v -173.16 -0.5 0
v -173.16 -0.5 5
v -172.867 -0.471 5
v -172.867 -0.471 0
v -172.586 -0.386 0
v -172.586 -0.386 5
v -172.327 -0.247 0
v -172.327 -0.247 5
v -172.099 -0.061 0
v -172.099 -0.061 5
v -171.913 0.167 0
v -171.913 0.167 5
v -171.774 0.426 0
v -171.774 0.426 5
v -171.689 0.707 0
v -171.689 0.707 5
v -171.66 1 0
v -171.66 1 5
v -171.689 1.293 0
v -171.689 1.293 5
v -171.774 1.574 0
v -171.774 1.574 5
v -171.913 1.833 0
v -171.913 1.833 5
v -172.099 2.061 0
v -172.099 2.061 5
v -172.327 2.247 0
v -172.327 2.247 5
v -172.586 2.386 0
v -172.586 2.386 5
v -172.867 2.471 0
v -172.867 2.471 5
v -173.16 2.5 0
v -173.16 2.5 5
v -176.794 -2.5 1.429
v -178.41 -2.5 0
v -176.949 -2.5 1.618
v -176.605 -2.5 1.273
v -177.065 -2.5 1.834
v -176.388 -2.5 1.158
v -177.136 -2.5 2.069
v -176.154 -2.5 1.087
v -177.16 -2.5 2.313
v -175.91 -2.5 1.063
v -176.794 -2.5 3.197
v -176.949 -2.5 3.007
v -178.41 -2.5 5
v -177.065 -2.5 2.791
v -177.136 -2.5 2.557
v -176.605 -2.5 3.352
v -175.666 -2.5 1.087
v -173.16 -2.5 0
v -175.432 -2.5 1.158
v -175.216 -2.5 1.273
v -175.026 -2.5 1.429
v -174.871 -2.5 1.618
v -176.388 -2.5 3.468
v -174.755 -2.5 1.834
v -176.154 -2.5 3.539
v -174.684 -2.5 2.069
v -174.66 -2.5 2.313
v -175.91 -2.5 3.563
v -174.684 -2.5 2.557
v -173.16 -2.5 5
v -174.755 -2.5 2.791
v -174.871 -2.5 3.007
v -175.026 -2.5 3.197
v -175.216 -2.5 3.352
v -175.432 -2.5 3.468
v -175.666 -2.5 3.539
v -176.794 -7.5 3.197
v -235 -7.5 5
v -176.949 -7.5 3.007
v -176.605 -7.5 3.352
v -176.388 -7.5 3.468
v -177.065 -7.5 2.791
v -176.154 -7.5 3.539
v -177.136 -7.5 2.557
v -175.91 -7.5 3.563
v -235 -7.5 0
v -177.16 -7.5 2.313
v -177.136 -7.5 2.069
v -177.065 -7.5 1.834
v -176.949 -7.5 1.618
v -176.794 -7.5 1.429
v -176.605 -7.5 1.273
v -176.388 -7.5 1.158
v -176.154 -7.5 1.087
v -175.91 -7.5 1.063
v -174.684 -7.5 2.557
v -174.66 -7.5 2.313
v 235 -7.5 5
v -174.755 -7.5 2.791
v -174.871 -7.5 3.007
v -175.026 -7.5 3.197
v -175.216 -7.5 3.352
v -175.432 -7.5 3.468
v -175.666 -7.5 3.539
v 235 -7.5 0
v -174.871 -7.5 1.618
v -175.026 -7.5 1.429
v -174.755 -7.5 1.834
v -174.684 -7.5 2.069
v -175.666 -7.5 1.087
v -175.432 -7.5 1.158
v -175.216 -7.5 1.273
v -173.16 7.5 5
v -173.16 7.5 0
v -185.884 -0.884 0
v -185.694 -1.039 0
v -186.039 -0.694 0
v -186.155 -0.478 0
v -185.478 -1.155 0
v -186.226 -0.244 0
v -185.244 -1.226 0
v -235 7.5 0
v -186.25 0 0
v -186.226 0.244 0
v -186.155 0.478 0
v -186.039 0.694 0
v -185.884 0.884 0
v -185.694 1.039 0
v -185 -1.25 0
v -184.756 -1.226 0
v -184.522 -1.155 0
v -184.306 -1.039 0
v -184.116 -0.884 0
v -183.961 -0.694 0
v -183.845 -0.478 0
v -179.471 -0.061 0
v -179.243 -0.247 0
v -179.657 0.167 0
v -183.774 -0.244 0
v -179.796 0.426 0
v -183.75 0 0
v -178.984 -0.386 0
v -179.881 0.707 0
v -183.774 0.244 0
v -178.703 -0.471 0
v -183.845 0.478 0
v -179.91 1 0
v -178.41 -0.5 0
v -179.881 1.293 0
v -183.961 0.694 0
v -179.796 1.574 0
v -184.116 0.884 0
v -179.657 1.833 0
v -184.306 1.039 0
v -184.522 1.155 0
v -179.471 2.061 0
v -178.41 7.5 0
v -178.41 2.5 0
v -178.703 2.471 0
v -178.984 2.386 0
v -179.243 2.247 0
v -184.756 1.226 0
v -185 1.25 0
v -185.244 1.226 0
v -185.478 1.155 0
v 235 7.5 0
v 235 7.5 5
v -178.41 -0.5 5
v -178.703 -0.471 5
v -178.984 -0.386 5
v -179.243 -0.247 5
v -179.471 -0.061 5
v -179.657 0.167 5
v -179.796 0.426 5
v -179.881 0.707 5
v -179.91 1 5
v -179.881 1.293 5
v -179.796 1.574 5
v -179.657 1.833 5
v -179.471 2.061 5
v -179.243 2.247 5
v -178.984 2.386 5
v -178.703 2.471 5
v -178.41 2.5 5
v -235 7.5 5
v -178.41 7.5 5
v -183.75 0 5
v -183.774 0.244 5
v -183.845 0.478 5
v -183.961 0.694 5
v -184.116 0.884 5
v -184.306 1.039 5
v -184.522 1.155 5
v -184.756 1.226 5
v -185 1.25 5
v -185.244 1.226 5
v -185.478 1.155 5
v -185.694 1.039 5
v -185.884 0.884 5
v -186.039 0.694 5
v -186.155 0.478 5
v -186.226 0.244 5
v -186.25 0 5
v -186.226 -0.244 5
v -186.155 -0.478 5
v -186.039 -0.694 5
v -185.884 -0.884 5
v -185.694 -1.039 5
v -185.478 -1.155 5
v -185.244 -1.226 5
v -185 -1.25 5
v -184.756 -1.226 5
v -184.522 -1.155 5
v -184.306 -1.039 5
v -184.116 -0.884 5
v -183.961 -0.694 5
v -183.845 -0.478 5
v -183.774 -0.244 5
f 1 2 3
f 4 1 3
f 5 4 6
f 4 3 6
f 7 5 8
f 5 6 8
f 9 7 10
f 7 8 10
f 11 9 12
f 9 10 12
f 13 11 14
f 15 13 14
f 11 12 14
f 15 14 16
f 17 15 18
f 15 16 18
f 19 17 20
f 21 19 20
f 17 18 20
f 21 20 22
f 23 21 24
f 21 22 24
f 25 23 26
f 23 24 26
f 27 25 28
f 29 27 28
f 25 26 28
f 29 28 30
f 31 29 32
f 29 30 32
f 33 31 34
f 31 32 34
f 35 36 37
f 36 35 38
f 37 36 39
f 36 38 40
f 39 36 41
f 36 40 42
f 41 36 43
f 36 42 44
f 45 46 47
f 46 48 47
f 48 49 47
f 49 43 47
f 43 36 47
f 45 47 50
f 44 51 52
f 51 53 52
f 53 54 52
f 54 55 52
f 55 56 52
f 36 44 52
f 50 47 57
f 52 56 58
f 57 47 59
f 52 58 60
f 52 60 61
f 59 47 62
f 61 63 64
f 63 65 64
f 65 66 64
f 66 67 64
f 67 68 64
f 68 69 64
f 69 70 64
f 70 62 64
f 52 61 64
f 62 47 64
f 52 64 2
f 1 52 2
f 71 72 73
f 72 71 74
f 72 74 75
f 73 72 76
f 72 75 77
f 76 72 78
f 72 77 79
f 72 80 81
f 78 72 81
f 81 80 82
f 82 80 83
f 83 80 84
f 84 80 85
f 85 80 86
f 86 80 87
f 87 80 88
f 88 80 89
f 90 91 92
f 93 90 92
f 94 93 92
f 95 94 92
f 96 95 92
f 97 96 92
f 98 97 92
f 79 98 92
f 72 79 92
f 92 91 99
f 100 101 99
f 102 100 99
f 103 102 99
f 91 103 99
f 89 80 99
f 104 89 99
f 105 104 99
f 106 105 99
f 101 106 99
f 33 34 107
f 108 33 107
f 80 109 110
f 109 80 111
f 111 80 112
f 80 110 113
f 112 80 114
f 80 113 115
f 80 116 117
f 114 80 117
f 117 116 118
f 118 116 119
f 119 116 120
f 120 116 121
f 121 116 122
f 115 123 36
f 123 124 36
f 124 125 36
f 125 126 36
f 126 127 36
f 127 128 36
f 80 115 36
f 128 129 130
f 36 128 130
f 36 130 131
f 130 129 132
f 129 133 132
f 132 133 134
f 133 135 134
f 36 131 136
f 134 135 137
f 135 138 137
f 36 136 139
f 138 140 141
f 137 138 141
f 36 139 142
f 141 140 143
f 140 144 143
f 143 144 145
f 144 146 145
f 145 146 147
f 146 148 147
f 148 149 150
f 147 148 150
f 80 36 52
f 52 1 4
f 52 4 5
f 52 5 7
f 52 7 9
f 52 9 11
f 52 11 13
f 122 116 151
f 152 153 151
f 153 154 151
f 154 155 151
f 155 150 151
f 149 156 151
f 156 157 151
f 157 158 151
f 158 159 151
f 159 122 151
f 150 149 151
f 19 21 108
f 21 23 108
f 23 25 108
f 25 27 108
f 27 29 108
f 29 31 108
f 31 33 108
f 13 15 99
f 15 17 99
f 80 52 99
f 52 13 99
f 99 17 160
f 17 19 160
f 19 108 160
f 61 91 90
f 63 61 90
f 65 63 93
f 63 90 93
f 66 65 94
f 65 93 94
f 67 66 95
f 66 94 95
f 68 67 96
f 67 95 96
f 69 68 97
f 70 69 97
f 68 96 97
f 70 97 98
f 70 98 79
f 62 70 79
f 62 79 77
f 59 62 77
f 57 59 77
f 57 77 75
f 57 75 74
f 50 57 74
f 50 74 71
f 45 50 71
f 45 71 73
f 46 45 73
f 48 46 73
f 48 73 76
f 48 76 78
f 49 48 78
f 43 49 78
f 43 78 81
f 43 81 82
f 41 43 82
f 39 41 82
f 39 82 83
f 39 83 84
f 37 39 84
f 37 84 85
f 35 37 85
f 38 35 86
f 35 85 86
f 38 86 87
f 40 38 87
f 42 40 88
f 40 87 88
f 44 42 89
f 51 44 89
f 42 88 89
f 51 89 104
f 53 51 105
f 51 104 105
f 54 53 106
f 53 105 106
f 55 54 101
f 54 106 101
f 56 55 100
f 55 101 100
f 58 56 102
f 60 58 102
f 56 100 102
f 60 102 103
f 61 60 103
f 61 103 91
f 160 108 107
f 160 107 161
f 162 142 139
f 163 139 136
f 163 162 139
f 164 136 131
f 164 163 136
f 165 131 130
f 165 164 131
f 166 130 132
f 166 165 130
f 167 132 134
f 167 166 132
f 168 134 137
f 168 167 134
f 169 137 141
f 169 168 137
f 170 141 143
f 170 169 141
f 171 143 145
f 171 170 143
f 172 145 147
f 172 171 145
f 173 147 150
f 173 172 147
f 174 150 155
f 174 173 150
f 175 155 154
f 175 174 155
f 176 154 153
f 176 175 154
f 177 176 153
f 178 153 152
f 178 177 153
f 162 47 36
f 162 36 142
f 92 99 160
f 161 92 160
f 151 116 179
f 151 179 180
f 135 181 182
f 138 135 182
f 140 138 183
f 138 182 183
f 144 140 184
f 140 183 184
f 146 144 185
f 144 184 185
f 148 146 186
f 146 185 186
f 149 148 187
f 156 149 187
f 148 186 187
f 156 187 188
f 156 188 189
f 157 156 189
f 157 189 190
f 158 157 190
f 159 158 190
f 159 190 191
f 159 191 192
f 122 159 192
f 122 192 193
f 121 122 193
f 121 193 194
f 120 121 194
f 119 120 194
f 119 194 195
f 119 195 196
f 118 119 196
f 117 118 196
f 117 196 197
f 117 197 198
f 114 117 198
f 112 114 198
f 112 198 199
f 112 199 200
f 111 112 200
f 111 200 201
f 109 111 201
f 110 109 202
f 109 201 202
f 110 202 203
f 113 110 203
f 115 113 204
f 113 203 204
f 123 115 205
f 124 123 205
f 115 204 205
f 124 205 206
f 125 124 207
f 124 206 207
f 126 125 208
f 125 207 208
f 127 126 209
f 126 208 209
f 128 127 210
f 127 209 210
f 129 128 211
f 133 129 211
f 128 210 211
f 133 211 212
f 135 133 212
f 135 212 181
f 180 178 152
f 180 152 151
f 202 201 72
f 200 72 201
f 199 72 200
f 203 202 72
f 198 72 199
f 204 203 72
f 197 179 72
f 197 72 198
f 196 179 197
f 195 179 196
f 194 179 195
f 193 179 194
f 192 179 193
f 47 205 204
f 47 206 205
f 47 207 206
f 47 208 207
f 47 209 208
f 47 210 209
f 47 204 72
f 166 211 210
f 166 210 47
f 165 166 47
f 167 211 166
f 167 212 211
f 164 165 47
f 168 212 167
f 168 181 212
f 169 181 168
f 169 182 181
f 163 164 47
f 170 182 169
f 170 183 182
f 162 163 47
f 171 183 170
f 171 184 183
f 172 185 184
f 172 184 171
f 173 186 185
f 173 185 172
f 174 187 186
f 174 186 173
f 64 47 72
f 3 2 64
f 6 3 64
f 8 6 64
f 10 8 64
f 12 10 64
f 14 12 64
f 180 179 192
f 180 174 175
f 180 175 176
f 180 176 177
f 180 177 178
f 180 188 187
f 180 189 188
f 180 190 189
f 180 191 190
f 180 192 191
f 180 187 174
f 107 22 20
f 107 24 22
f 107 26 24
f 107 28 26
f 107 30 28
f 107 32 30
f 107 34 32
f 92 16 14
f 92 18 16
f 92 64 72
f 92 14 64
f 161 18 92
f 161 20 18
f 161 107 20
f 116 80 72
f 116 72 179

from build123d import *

# Parameters (mm, degrees)
ESQUISSE1_W             = 470
ESQUISSE1_H             = 15
BOSS_EXTRU_1_DEPTH      = 5
ESQUISSE2_R             = 1.25
ENL_V_MAT_EXTRU_1_DEPTH = 6
ESQUISSE3_W             = 5.25
ESQUISSE3_H             = 10
ENL_V_MAT_EXTRU_2_DEPTH = 6
ESQUISSE4_R             = 1.25
ENL_V_MAT_EXTRU_3_DEPTH = 10
ENL_V_MAT_EXTRU_4_DEPTH = 10


with BuildPart() as part:
    # Esquisse1 → Boss.-Extru.1 (new body)
    with BuildSketch(Plane.XY):
        Rectangle(ESQUISSE1_W, ESQUISSE1_H)
    extrude(amount=BOSS_EXTRU_1_DEPTH)

    # Esquisse2 → Enlèv. mat.-Extru.1 (cut, through all)
    with BuildSketch(Plane.XY.offset(5)):
        with Locations((-185, 0)):
            Circle(ESQUISSE2_R)
    extrude(amount=-ENL_V_MAT_EXTRU_1_DEPTH, mode=Mode.SUBTRACT)

    # Esquisse3 → Enlèv. mat.-Extru.2 (cut, through all)
    with BuildSketch(Plane.XY.offset(5)):
        with Locations((-175.785038425, 2.5)):
            Rectangle(ESQUISSE3_W, ESQUISSE3_H)
    extrude(amount=-ENL_V_MAT_EXTRU_2_DEPTH, mode=Mode.SUBTRACT)

    # Esquisse4 → Enlèv. mat.-Extru.3 (cut)
    with BuildSketch(Plane(origin=(0, -7.5, 0), x_dir=(-1, 0, 0), z_dir=(0, -1, 0))):
        with Locations(Location((175.910038425, -2.312700885, 0), (0, 0, 180))):  # turned: the seam where the file's is
            Circle(ESQUISSE4_R)
    extrude(amount=-ENL_V_MAT_EXTRU_3_DEPTH, mode=Mode.SUBTRACT)

    # Esquisse5 → Enlèv. mat.-Extru.4 (cut)
    with BuildSketch(Plane.XY.offset(5)):
        with BuildLine():
            Line((-178.410038425, 2.5), (-178.410038425, -0.5))
            ThreePointArc((-178.410038425, -0.5), (-179.910038425, 1), (-178.410038425, 2.5))
        make_face()
        with BuildLine():
            Line((-173.160038425, 2.5), (-173.160038425, -0.5))
            ThreePointArc((-173.160038425, -0.5), (-171.660038425, 1), (-173.160038425, 2.5))
        make_face()
    extrude(amount=-ENL_V_MAT_EXTRU_4_DEPTH, mode=Mode.SUBTRACT)


solid = part.part
